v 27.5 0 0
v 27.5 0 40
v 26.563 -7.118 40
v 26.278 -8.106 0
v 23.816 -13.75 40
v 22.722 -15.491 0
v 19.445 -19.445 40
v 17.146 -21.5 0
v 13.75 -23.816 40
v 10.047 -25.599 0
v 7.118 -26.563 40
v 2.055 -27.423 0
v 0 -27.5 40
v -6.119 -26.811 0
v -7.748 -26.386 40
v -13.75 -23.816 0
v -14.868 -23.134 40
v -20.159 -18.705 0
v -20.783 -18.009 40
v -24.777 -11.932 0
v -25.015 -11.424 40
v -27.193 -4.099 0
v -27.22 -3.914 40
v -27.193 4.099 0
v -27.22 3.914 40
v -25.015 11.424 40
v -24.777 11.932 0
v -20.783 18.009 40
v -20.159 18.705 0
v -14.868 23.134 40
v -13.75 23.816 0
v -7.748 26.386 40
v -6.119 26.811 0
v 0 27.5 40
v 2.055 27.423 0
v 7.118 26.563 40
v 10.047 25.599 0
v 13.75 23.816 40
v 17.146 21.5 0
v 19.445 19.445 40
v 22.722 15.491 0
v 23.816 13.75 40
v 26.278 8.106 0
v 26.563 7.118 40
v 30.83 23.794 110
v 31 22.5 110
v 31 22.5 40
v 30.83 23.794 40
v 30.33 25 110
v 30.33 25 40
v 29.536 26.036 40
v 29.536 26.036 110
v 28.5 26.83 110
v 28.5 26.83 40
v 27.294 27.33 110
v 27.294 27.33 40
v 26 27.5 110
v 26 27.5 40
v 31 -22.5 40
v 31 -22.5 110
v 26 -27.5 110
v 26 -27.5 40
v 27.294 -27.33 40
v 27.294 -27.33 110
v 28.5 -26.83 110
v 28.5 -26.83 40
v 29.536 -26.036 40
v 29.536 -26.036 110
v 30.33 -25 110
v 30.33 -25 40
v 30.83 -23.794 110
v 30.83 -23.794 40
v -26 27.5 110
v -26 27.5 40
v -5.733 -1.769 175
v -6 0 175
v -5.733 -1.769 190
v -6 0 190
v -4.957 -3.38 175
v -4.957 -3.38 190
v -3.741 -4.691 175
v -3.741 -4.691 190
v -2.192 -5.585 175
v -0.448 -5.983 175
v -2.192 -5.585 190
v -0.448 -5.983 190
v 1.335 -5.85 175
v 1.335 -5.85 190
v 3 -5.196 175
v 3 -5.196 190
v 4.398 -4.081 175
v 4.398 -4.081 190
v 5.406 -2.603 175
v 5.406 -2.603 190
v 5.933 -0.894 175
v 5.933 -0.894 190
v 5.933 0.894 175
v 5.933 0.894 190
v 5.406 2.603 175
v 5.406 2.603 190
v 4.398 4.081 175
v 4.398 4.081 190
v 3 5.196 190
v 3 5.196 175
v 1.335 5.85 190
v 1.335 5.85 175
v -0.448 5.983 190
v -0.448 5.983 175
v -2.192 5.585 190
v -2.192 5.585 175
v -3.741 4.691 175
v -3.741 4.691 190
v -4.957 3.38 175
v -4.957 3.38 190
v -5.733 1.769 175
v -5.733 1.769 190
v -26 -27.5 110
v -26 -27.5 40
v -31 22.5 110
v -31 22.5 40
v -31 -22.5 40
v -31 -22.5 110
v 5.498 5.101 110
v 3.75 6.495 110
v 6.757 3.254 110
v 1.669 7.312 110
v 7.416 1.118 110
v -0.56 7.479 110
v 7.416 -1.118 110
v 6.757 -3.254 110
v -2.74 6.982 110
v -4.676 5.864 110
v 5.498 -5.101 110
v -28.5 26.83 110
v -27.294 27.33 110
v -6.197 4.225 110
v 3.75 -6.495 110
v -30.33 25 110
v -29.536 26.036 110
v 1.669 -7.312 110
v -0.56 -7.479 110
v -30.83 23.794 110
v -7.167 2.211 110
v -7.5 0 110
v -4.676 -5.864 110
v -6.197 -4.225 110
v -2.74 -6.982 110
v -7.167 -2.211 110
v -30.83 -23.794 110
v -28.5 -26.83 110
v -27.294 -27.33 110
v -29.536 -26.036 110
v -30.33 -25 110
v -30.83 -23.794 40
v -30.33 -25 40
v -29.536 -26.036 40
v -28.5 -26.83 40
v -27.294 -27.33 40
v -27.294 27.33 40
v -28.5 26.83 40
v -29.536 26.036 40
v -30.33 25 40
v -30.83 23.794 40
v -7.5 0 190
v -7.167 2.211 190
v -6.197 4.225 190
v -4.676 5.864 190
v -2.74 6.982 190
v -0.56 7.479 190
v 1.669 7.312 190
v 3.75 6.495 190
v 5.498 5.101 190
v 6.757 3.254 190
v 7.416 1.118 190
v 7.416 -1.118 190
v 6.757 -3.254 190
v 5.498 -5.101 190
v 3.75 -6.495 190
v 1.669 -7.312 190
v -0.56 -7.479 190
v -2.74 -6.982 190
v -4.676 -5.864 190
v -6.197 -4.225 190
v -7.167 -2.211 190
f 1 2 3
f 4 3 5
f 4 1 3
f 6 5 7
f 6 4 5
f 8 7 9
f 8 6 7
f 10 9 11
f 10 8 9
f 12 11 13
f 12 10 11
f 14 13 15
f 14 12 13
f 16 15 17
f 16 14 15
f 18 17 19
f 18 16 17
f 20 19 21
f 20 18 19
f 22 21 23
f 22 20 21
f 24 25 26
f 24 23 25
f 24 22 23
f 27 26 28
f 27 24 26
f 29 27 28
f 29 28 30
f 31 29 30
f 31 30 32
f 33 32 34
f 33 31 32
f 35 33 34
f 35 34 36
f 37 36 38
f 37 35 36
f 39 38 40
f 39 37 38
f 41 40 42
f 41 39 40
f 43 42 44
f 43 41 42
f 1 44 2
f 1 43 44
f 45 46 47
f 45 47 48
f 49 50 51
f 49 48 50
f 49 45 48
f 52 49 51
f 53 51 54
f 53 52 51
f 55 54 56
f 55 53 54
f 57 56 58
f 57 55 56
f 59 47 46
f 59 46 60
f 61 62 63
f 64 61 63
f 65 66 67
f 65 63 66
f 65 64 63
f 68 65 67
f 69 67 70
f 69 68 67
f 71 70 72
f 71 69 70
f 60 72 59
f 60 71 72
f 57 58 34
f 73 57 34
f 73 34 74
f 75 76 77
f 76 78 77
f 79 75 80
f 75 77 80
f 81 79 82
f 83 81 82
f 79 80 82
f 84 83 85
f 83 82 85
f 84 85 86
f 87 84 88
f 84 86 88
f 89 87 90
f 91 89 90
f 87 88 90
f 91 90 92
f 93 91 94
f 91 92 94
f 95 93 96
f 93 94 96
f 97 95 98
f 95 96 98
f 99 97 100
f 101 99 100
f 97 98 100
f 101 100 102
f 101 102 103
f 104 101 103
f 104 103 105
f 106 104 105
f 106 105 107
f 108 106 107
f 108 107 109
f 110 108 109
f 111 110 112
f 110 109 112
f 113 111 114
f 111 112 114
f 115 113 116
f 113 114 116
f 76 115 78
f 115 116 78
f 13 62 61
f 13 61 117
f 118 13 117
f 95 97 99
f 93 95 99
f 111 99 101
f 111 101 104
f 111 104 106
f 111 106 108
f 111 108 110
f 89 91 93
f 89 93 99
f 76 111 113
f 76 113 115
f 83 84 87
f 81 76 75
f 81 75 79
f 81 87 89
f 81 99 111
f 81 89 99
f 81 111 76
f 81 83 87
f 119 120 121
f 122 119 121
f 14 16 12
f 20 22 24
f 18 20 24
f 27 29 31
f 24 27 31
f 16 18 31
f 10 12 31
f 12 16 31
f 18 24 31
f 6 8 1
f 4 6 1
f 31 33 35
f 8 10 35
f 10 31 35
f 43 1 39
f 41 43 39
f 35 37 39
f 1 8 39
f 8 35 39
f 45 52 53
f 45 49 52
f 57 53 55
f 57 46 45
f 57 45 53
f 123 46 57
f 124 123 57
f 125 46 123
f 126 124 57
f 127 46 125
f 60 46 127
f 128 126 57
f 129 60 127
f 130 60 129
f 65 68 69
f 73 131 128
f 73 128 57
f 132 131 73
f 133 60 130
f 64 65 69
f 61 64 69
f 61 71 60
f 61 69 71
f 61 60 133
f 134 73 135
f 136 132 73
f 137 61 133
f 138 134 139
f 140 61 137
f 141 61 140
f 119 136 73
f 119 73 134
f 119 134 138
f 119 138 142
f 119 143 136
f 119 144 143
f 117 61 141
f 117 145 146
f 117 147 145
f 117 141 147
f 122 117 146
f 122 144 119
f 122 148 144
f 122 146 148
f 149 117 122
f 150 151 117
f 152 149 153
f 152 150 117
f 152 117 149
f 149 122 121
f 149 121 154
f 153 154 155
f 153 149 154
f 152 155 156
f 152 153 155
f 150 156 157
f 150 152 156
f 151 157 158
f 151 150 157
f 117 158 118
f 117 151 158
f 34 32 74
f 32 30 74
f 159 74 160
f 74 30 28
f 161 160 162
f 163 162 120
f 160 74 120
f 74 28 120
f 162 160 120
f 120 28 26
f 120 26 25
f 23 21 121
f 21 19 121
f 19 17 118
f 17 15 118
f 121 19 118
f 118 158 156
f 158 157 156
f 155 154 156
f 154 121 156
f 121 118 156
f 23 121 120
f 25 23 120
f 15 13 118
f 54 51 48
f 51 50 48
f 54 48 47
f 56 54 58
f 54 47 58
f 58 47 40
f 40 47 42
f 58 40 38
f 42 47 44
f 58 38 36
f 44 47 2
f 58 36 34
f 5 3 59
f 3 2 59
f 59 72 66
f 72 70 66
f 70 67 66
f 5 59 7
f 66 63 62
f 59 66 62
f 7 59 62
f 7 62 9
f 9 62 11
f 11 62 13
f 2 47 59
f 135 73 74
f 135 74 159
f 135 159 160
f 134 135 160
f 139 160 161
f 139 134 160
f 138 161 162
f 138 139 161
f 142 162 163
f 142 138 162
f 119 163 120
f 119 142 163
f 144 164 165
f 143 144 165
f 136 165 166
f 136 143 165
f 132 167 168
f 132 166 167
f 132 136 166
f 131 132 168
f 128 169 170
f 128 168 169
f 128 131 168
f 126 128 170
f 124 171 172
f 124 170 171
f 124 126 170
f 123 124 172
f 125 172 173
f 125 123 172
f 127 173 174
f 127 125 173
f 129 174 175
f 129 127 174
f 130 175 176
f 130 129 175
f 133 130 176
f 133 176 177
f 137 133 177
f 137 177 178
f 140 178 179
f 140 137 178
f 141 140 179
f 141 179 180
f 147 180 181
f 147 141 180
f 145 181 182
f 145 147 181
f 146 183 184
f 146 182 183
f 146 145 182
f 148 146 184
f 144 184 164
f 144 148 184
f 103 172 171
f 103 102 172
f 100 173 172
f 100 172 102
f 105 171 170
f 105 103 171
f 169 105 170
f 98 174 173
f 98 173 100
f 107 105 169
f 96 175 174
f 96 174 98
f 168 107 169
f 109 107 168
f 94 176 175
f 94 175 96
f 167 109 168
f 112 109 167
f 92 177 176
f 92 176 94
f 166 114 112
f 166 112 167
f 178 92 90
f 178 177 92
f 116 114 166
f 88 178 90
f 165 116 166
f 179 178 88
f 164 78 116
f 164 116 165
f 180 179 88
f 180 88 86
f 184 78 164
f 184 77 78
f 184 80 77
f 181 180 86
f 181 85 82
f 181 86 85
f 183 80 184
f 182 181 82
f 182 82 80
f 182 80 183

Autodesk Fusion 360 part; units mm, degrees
sketch "Sketch1" plane through (0, 0, 0) normal (0, 0, 1) x (1, 0, 0)
  circle A0 centre (0, 0) radius 27.5
  dimension "d1" = 55
extrude "Extrude1" add sketch "Sketch1" along normal blind 40
sketch "Sketch2" plane through (0, 0, 40) normal (0, 0, 1) x (-1, 0, 0)
  circle A0 centre (0, 0) radius 27.5
  line L0 (0, -27.5) -> (-31, -27.5)
  line L1 (-31, -27.5) -> (-31, 40.6198)
  line L2 (0, 27.5) -> (-33.618, 27.5)
  line L3 (0, -27.5) -> (31, -27.5)
  line L4 (31, -27.5) -> (31, 43)
  line L5 (0, 27.5) -> (37, 27.5)
  dimension "d4" = 90
  dimension "d5" = 31
extrude "Extrude2" add sketch "Sketch2" along normal blind 70
sketch "Sketch3" plane through (0, 0, 110) normal (0, 0, 1) x (-1, 0, 0)
  line L0 (-31, -27.5) -> (31, -27.5)
  line L1 (31, -27.5) -> (31, 27.5)
  line L2 (31, 27.5) -> (-31, 27.5)
  line L3 (-31, 27.5) -> (-31, -27.5)
  circle A0 centre (0, 0) radius 7.5
  dimension "d8" = 15
extrude "Extrude3" add sketch "Sketch3" along normal blind 80 contours A0
sketch "Sketch4" plane through (0, 0, 0) normal (0, 1, 0) x (1, 0, 0)
sketch "Sketch5" plane through (0, 0, 190) normal (0, 0, 1) x (-1, 0, 0)
  circle A0 centre (0, 0) radius 7.5
  circle A1 centre (0, 0) radius 6
  dimension "d14" = 12
extrude "Extrude4" cut sketch "Sketch5" against normal blind 15 contours A1
fillet "Fillet2" radius 5 4 edges at (-31, -27.5, 75) (31, -27.5, 75) (31, 27.5, 75) (-31, 27.5, 75)
